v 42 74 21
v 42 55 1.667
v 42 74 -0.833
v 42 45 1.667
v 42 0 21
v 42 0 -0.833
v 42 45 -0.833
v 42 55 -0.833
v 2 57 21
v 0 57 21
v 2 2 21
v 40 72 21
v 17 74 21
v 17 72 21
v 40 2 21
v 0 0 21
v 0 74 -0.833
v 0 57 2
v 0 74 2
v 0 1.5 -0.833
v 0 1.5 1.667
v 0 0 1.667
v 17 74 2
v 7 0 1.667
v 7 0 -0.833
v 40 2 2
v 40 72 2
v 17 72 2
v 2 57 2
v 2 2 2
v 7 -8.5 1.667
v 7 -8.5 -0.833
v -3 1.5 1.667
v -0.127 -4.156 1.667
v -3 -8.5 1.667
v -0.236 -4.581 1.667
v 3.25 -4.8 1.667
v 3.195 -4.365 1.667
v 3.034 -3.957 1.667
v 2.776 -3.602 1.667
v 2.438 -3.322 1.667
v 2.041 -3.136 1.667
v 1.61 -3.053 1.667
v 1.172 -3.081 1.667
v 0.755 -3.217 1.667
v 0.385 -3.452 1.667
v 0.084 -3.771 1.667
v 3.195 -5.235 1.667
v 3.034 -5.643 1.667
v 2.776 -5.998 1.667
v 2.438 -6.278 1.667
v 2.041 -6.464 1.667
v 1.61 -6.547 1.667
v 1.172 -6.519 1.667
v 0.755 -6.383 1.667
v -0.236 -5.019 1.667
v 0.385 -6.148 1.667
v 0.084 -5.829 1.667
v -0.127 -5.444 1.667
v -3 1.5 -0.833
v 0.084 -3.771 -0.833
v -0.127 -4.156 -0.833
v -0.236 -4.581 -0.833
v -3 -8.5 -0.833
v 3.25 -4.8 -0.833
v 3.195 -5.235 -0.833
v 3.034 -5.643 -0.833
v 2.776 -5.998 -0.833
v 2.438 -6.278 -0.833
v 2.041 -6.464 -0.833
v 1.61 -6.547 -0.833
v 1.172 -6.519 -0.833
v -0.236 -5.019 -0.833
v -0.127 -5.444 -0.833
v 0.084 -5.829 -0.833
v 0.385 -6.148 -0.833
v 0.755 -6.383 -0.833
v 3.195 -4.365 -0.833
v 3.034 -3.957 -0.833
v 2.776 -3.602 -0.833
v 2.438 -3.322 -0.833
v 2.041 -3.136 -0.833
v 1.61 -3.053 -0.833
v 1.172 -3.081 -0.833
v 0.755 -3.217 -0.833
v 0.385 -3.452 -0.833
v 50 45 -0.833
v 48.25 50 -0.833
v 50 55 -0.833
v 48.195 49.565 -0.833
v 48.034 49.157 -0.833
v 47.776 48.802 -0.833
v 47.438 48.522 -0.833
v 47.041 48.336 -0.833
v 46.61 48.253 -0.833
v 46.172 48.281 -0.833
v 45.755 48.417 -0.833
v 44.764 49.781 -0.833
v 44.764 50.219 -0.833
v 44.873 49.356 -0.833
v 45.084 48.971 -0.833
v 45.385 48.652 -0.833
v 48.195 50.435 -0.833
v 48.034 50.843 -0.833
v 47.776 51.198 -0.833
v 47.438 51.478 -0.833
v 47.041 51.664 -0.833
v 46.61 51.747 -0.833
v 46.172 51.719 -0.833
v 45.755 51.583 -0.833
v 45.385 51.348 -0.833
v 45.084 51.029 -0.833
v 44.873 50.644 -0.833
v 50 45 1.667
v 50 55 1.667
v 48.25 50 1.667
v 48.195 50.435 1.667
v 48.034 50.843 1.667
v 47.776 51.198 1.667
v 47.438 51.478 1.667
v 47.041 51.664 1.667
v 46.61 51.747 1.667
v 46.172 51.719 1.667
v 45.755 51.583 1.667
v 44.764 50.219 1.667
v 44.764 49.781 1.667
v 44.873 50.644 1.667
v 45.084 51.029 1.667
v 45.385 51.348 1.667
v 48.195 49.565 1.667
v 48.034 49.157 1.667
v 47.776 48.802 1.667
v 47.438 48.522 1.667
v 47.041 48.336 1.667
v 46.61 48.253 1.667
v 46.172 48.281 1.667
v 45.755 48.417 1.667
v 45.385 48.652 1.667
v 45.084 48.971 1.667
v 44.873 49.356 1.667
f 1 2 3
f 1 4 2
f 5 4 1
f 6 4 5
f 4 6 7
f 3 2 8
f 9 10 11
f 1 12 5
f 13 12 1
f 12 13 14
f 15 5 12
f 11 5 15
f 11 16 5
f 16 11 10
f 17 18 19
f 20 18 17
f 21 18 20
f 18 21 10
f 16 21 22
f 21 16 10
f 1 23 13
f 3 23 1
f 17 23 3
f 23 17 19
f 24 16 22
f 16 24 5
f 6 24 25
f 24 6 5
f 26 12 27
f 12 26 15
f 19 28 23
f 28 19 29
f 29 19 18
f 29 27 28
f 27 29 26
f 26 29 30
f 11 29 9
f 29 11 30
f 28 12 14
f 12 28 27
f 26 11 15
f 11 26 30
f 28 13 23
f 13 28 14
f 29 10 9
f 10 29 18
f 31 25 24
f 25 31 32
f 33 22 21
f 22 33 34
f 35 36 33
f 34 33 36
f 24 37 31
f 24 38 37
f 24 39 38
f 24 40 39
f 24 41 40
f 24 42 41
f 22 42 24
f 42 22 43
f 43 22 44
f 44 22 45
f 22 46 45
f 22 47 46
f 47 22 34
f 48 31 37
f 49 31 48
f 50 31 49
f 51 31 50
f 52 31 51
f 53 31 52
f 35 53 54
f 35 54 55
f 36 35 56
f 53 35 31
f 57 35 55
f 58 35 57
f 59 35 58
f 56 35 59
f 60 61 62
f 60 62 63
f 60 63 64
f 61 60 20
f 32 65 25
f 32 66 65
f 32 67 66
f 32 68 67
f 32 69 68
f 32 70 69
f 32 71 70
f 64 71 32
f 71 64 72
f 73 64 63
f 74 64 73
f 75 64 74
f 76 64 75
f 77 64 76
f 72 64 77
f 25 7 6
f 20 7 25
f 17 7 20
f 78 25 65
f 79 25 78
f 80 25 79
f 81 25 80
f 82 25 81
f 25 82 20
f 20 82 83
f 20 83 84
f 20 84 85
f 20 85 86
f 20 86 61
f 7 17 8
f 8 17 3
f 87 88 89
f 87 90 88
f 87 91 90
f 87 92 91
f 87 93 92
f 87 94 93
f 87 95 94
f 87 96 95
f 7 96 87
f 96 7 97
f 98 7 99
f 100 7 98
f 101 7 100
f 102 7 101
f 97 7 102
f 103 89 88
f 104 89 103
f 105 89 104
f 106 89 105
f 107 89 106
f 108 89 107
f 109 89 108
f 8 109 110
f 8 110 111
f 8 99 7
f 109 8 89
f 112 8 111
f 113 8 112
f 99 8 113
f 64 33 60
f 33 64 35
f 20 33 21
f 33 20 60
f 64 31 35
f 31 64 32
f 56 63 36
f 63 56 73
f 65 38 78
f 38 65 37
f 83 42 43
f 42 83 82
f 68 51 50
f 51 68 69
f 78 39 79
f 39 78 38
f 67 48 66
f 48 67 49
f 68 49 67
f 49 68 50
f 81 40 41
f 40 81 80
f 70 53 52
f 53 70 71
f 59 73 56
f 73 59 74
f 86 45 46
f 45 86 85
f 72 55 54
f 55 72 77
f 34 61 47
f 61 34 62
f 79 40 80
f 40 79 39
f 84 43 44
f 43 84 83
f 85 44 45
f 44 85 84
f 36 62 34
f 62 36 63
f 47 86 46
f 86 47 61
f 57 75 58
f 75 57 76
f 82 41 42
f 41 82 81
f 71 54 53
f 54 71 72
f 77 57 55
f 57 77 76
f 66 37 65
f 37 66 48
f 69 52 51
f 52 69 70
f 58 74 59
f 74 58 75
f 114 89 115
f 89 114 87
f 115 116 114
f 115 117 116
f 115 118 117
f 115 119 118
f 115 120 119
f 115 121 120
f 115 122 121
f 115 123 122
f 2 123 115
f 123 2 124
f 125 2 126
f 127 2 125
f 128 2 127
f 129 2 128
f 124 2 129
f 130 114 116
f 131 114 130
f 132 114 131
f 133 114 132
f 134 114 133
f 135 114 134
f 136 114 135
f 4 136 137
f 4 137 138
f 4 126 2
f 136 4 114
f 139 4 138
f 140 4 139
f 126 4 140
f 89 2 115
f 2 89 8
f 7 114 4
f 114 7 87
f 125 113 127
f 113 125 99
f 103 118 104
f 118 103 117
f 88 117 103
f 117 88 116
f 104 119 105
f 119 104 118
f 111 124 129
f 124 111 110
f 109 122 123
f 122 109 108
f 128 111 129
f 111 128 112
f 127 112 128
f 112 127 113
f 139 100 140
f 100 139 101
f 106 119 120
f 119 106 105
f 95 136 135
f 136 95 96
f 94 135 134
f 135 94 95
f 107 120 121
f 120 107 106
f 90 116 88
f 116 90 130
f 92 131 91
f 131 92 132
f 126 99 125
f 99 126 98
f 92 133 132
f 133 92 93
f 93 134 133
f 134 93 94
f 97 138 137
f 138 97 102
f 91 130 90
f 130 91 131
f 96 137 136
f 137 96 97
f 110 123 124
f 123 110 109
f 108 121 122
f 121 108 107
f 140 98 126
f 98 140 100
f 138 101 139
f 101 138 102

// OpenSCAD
espesor_pared = 2;

largo_interno = 70;
ancho_interno = 38;
alto_interno = 19;

alto_externo = alto_interno + espesor_pared;
largo_externo = largo_interno + 2 * espesor_pared;
ancho_externo = ancho_interno + 2 * espesor_pared;

ancho_agujero = 15;
largo_agujero = 15;
alto_cola = 15;

ancho_llave = 16;
desp_ancho_llave = 13;

ancho_base = 42;
alto_base = 2.5;
delta_ancho = 0;

largo_base_interno = 42;

tornillo = 8;

radio = 94.25;
antigolpe = 8;


difference() {
  cube([ancho_externo,largo_externo,alto_externo]);
  translate([espesor_pared,espesor_pared,espesor_pared])
    cube([ancho_interno,largo_interno,alto_interno+.01]);
  translate([-.1,largo_externo-largo_agujero-espesor_pared,espesor_pared])
    cube([ancho_agujero+espesor_pared+.1,largo_agujero+espesor_pared+.01,alto_interno+.1]);
}

difference() {
	translate([-((ancho_base-ancho_externo)/2 - delta_ancho),0,-alto_base/3])
   		cube([ancho_base, largo_externo, alto_base]);
}

module pestania_agujero1(){
	difference(){
		translate([-3, -8.5, -alto_base/3])
			cube([10, 10, alto_base]);
		translate([1.5, -4.8, -alto_base/3])
			cylinder(h = alto_base*2, r = 1.75, $fn=25, center = false);
	}
}

module pestania_agujero2(){
	difference(){
		translate([40, 45, -alto_base/3])
			cube([10, 10, alto_base]);
		translate([46.5, 50, -alto_base/3])
			cylinder(h = alto_base*2, r = 1.75, $fn=25, center = false);
	}
}

pestania_agujero1();

pestania_agujero2();

*translate([46.5, 50, -5])
	cylinder(h = 10, r = 1.75, $fn=25, center = false);

*difference(){
  translate([ancho_externo-espesor_pared,0,-alto_cola-alto_base])
    cube([espesor_pared,largo_externo,alto_cola+alto_base+.1]);

  translate([ancho_externo-espesor_pared-.01,desp_ancho_llave,-alto_cola-alto_base-.01])
    cube([espesor_pared+.02,ancho_llave+.01,alto_base]);
}
